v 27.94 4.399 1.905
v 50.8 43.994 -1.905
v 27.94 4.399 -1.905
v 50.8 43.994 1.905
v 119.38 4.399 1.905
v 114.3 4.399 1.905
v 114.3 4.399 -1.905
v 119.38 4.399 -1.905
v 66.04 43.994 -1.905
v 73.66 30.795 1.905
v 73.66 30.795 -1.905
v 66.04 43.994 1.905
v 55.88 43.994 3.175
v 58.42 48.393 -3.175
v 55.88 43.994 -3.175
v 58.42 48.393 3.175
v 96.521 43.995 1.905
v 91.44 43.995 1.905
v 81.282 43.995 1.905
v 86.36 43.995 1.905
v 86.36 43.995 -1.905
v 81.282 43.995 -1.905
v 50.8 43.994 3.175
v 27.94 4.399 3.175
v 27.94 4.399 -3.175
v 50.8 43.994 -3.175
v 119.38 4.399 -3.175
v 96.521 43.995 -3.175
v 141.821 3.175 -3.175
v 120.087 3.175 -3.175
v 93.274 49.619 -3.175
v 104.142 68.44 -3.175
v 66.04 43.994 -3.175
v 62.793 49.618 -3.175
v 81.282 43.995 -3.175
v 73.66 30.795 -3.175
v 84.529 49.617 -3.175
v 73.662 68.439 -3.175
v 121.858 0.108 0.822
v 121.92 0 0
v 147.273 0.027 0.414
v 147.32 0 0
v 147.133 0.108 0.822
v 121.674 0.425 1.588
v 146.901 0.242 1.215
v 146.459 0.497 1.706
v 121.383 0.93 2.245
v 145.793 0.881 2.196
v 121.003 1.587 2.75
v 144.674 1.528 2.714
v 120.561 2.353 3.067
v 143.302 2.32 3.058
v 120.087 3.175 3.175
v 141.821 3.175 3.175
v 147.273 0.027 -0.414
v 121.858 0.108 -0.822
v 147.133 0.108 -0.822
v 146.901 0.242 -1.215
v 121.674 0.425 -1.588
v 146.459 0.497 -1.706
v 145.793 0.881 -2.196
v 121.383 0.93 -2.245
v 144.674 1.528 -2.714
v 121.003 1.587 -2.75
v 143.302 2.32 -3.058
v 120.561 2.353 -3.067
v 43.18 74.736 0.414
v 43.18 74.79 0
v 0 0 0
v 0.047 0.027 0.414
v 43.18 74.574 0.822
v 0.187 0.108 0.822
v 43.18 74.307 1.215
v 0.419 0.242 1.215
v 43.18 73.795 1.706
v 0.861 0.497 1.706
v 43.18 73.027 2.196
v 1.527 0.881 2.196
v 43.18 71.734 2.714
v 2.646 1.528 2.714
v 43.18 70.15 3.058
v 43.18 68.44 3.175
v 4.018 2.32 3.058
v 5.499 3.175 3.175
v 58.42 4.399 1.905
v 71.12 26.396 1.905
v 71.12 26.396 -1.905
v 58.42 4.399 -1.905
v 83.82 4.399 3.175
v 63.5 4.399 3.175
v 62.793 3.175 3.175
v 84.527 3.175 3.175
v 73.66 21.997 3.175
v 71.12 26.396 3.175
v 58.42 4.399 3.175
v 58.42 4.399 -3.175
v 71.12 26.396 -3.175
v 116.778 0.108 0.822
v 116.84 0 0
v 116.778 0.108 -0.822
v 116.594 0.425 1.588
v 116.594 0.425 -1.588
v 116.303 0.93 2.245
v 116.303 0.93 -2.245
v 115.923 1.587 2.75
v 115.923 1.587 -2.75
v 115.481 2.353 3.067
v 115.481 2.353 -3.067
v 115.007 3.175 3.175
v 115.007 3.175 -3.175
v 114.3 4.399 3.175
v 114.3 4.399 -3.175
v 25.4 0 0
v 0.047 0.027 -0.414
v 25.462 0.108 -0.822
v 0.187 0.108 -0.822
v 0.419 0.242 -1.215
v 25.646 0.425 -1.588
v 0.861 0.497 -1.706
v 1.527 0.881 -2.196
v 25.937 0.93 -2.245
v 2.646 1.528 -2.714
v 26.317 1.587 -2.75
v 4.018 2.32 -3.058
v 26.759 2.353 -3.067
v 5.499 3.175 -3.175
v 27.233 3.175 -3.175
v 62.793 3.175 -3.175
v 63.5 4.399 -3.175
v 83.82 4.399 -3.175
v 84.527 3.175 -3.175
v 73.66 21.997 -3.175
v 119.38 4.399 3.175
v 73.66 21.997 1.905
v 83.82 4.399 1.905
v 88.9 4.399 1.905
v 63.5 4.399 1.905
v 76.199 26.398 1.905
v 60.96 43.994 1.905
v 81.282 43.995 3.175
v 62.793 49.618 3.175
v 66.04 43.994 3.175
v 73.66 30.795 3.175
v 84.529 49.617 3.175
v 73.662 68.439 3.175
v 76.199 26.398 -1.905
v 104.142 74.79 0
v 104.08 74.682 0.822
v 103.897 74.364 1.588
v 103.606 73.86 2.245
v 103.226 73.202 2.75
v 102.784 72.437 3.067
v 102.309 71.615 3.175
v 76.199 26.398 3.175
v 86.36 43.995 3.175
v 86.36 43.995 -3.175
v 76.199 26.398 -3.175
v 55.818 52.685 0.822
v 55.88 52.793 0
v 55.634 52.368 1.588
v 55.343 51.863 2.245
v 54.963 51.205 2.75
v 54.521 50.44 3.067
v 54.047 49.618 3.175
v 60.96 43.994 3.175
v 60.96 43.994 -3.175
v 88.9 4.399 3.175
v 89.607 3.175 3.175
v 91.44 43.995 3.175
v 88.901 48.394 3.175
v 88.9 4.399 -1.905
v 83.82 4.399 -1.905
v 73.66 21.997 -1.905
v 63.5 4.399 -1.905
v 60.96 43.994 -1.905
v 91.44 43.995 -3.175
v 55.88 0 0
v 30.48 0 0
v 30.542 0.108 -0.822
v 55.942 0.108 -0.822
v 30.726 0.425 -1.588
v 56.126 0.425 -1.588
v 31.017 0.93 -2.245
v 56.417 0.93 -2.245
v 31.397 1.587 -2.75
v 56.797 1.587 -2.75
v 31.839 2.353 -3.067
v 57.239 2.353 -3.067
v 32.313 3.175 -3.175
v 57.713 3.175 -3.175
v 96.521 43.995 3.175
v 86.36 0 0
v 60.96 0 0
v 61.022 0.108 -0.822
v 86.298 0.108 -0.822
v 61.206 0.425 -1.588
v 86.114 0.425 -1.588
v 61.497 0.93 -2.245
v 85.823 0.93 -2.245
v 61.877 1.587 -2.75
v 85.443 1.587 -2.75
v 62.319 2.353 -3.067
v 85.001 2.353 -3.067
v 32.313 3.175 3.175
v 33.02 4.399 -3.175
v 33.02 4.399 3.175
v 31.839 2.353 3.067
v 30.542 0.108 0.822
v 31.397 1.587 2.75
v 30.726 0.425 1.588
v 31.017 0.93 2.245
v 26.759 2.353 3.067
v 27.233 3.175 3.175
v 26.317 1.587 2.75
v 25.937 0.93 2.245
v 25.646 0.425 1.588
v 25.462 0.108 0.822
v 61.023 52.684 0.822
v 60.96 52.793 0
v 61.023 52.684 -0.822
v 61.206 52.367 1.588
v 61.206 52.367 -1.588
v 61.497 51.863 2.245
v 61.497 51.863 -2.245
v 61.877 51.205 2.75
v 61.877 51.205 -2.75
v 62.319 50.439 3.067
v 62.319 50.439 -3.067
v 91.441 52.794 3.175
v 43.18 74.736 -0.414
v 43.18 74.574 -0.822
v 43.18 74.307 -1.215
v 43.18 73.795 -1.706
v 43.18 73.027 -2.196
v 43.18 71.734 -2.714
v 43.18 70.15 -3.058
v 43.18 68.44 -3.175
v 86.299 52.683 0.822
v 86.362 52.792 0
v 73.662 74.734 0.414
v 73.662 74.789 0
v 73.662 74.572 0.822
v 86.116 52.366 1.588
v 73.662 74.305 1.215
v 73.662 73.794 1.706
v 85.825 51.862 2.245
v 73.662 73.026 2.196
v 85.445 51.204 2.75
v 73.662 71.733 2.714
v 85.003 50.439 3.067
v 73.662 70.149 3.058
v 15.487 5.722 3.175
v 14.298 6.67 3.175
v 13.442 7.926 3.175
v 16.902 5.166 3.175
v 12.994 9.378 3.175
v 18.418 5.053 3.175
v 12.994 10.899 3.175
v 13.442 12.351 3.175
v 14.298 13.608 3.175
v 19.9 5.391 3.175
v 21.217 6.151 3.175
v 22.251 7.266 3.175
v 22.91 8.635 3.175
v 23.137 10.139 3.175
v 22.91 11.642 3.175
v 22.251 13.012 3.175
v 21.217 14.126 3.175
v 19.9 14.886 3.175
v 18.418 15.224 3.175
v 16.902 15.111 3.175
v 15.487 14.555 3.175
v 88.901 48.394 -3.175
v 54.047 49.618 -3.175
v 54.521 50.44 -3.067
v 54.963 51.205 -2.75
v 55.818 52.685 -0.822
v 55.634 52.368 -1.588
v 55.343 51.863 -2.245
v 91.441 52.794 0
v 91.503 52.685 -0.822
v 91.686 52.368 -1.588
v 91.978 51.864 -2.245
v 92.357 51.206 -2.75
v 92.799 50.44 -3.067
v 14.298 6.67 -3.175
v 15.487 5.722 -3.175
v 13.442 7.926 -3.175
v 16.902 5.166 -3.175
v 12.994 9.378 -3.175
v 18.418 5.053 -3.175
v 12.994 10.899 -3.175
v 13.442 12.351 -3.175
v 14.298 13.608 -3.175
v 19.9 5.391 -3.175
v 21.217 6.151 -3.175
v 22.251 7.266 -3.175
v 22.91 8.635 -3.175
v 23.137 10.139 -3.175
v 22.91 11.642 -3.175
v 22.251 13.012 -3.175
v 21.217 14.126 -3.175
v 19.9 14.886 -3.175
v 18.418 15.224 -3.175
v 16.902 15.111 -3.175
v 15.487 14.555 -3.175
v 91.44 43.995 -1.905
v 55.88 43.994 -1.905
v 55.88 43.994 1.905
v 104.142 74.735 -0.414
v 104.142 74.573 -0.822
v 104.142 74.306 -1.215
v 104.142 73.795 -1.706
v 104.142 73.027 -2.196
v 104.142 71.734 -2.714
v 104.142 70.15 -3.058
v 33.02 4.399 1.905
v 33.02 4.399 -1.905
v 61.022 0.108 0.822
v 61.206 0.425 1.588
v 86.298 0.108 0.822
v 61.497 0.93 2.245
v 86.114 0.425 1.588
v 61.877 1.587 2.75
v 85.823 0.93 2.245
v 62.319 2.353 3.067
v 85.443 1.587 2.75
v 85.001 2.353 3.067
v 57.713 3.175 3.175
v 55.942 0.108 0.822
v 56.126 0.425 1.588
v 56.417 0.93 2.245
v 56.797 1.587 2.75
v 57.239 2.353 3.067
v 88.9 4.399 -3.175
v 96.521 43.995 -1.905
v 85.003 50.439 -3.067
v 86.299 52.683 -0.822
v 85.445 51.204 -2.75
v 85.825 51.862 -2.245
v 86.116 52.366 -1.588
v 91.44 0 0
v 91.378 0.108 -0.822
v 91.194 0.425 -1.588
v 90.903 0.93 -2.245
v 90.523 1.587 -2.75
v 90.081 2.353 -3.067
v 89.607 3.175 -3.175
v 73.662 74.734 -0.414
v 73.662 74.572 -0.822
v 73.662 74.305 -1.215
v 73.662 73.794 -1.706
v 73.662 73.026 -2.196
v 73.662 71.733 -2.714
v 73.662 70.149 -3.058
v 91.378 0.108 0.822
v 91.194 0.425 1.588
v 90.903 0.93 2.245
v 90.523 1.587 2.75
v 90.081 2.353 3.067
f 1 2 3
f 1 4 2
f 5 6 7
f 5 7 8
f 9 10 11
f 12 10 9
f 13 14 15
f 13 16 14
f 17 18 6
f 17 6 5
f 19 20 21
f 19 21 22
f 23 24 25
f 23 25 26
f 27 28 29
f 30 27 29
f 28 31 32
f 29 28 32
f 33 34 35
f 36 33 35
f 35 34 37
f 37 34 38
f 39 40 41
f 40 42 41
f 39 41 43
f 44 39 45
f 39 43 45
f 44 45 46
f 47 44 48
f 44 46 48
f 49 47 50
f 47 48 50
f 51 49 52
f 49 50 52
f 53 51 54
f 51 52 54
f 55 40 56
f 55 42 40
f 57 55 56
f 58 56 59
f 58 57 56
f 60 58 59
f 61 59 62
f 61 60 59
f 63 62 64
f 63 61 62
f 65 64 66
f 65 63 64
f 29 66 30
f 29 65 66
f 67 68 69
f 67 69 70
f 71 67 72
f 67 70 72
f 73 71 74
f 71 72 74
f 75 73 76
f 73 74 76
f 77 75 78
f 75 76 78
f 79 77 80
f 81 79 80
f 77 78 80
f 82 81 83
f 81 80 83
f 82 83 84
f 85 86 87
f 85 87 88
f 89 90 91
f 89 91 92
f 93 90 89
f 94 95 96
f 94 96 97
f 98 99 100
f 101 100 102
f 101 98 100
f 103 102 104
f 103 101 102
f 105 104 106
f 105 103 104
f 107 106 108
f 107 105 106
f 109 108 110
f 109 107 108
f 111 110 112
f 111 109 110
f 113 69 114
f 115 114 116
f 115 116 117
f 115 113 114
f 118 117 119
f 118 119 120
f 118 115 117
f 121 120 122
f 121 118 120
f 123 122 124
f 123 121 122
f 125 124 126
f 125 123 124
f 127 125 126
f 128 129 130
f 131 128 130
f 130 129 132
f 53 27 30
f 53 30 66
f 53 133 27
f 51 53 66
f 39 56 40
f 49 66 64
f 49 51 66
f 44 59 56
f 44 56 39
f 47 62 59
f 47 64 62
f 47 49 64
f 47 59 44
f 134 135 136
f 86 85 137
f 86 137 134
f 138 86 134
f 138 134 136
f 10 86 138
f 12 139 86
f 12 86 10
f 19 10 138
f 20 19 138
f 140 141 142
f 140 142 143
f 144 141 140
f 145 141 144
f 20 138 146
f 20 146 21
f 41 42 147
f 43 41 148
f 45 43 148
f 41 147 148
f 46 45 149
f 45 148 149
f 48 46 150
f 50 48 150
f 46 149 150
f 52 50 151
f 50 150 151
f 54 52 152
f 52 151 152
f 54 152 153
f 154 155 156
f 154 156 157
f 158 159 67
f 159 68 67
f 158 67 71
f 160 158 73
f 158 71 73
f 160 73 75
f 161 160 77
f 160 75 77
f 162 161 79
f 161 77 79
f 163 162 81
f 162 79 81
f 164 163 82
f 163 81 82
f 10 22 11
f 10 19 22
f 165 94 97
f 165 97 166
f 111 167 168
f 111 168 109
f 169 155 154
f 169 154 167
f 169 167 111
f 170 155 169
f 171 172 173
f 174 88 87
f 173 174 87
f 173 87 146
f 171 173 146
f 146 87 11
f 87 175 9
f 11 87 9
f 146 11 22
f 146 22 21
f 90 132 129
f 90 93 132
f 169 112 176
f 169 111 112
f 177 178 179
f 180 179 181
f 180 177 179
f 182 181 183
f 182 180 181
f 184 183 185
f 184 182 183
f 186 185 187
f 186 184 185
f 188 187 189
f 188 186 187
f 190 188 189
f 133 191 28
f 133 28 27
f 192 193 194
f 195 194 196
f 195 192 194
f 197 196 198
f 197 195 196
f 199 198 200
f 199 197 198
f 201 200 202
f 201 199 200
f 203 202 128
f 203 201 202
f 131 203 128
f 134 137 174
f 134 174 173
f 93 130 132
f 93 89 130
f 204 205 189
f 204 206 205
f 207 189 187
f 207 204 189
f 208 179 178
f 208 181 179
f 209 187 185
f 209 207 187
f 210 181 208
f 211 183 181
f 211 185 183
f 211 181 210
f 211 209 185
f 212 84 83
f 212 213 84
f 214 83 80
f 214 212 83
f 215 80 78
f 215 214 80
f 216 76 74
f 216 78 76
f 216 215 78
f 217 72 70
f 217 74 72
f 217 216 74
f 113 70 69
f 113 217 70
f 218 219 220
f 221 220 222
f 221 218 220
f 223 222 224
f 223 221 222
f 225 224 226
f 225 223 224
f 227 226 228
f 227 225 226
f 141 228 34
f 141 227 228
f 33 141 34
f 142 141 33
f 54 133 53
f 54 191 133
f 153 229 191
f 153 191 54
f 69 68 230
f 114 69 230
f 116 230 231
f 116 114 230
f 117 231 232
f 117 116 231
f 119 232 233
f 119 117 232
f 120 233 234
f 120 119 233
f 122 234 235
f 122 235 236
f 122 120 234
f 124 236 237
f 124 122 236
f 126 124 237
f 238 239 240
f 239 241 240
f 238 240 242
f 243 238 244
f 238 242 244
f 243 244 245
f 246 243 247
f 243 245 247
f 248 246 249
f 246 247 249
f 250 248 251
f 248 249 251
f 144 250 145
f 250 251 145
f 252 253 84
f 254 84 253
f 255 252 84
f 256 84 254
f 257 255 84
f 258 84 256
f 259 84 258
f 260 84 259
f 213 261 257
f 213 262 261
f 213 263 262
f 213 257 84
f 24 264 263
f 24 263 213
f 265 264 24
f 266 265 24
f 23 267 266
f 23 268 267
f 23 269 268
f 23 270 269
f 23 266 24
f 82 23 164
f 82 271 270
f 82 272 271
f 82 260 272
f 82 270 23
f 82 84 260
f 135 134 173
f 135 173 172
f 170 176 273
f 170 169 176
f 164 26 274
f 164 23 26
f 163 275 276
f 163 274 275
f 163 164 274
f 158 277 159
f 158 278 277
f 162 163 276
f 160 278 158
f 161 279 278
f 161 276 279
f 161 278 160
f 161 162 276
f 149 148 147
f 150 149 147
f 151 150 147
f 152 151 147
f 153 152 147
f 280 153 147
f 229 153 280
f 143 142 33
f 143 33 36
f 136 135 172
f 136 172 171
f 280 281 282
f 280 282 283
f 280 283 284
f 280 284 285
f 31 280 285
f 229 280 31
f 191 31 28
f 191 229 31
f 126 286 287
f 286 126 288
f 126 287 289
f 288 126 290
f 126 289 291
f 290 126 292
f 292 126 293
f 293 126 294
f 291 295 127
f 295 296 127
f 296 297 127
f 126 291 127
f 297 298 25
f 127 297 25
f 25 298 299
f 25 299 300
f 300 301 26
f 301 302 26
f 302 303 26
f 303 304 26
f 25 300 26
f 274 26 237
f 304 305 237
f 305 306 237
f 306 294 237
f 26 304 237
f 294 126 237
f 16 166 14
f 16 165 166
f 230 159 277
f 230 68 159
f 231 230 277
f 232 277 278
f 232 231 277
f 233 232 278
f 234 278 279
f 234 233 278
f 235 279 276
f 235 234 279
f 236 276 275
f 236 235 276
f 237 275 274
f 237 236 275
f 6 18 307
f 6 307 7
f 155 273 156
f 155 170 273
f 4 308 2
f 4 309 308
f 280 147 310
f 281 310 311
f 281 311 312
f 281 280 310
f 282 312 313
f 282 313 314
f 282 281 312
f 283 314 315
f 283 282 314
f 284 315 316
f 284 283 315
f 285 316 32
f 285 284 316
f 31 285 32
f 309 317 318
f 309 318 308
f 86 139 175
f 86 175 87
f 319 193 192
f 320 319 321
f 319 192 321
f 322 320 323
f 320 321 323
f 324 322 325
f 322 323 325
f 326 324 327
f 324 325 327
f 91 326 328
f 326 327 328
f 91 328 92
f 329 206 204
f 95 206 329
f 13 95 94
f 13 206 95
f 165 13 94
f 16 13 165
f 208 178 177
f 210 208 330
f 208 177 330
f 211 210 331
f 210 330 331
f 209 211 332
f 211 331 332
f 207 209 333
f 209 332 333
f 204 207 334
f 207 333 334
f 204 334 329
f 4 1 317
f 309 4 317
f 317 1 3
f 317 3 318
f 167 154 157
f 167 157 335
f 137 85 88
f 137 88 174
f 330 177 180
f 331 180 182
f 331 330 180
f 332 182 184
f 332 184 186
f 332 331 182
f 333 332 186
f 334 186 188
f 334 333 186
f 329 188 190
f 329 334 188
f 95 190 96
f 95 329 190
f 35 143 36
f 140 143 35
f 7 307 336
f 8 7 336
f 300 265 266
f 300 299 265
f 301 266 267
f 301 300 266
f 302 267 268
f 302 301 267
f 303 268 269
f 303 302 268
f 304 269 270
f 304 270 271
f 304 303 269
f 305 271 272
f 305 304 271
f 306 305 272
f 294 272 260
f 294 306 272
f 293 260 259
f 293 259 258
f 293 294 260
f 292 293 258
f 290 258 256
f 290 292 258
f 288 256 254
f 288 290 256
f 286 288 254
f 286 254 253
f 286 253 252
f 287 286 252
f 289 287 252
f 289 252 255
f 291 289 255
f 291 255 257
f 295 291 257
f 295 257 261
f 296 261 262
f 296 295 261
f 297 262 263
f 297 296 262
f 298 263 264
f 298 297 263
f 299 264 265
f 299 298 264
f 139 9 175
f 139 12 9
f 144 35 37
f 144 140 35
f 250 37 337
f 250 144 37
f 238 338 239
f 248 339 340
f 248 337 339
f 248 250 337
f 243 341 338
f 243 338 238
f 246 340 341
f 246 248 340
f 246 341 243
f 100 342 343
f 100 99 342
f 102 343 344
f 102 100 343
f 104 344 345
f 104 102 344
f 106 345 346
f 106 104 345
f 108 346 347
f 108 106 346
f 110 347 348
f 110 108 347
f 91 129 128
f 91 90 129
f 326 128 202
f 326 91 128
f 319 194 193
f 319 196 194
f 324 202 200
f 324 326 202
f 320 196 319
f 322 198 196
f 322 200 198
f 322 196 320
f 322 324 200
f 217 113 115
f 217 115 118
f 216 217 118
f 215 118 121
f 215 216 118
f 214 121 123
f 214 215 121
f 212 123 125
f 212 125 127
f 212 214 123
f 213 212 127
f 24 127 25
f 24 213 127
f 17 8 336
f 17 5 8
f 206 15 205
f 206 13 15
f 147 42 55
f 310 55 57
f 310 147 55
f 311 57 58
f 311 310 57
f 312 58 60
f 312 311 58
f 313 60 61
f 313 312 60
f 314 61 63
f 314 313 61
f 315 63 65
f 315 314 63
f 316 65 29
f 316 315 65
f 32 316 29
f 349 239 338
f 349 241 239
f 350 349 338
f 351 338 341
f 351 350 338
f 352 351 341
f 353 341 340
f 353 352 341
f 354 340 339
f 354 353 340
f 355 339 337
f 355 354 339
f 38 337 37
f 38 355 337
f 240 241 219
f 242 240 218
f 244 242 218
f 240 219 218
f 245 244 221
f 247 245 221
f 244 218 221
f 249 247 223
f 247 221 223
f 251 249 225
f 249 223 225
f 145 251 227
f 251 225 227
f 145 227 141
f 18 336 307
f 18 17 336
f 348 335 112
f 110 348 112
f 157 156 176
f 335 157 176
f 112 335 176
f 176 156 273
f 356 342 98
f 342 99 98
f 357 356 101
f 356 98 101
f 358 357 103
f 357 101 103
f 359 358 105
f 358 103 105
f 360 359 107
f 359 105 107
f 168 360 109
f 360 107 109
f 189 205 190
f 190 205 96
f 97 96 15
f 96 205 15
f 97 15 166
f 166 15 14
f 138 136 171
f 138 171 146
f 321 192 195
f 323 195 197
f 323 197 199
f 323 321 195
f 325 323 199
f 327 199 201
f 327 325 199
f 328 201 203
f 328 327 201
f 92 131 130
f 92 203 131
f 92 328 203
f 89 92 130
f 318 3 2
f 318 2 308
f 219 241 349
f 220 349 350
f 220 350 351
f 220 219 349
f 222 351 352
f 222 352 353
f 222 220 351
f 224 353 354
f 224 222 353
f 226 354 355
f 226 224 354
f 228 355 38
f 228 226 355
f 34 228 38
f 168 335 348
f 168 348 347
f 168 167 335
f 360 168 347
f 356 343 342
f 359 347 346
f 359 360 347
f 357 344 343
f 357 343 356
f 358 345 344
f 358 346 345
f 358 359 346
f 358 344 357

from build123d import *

# Parameters (mm, degrees)
F1_DEPTH = 3.175
F0_R     = 5.1001358677
F2_DEPTH = 1.905
F3_R     = 3.17499
F3_2_R   = 3.17499
F3_3_R   = 3.17499
F3_4_R   = 3.17499
F3_5_R   = 3.17499
F3_6_R   = 3.17499


# Not quite as in the source:
# - a fillet or chamfer is up to 0.001 mm smaller than in the source, because OpenCascade refuses the exact size


with BuildPart() as f1:
    # F0 (on Top) → F1 (new body, symmetric)
    with BuildSketch(Plane.XY):
        Polygon((55.88, 43.9940905122), (33.02, 4.3994090512), (30.48, 0), (55.88, 0), (58.42, 4.3994090512), (71.12, 26.3964543073), (60.96, 43.9940905122), (58.42, 48.3934995635), align=None)
    extrude(amount=F1_DEPTH, both=True)

    # F3#3 (radius 3.175 in the source; OpenCascade refuses exactly that, so slightly less here)
    f3_3_edges = [f1.edges().sort_by_distance(p)[0] for p in [
        (43.18, 0, -3.175),
        (43.18, 0, 3.175),
    ]]
    fillet(f3_3_edges, radius=F3_3_R)


with BuildPart() as f1b:
    # F0 (on Top) → F1, piece 2 (new body, symmetric)
    with BuildSketch(Plane.XY):
        Polygon((60.9602140859, 52.792537807), (66.04, 43.9940905122), (73.6602140859, 30.7954925508), (81.2823551529, 43.9952028573), (86.3618197643, 52.79161069), (73.6618197643, 74.7886559461), align=None)
    extrude(amount=F1_DEPTH, both=True)

    # F3#2 (radius 3.175 in the source; OpenCascade refuses exactly that, so slightly less here)
    f3_2_edges = [f1b.edges().sort_by_distance(p)[0] for p in [
        (67.311017, 63.790597, 3.175),
        (80.01182, 63.790133, 3.175),
        (80.01182, 63.790133, -3.175),
        (67.311017, 63.790597, -3.175),
    ]]
    fillet(f3_2_edges, radius=F3_2_R)


with BuildPart() as f1c:
    # F0 (on Top) → F1, piece 3 (new body, symmetric)
    with BuildSketch(Plane.XY):
        Polygon((88.9005352487, 48.3944264851), (86.360214113, 43.9952028573), (76.1989295703, 26.398308346), (88.9, 4.3994090512), (91.44, 0), (116.84, 0), (114.300072982, 4.3994511866), (91.4404622667, 43.9949752986), align=None)
    extrude(amount=F1_DEPTH, both=True)

    # F3#5 (radius 3.175 in the source; OpenCascade refuses exactly that, so slightly less here)
    f3_5_edges = [f1c.edges().sort_by_distance(p)[0] for p in [
        (104.14, 0, -3.175),
        (104.14, 0, 3.175),
    ]]
    fillet(f3_5_edges, radius=F3_5_R)


with BuildPart() as f1d:
    # F0 (on Top) → F1, piece 4 (new body, symmetric)
    with BuildSketch(Plane.XY):
        Polygon((73.66, 21.9970452561), (63.5, 4.3994090512), (60.96, 0), (86.36, 0), (83.82, 4.3994090512), align=None)
    extrude(amount=F1_DEPTH, both=True)

    # F3#4 (radius 3.175 in the source; OpenCascade refuses exactly that, so slightly less here)
    f3_4_edges = [f1d.edges().sort_by_distance(p)[0] for p in [
        (73.66, 0, -3.175),
        (73.66, 0, 3.175),
    ]]
    fillet(f3_4_edges, radius=F3_4_R)


with BuildPart() as f1e:
    # F0 (on Top) → F1, piece 5 (new body, symmetric)
    with BuildSketch(Plane.XY):
        Polygon((91.4408563844, 52.793650113), (96.520559582, 43.9949752986), (119.3800827134, 4.3994511866), (121.92, 0), (147.32, 0), (104.1424620628, 74.7897682521), align=None)
    extrude(amount=F1_DEPTH, both=True)

    # F3#6 (radius 3.175 in the source; OpenCascade refuses exactly that, so slightly less here)
    f3_6_edges = [f1e.edges().sort_by_distance(p)[0] for p in [
        (134.62, 0, -3.175),
        (125.731231, 37.394884, -3.175),
        (97.791659, 63.791709, -3.175),
        (134.62, 0, 3.175),
        (125.731231, 37.394884, 3.175),
    ]]
    fillet(f3_6_edges, radius=F3_6_R)


with BuildPart() as f1f:
    # F0 (on Top) → F1, piece 6 (new body, symmetric)
    with BuildSketch(Plane.XY):
        Polygon((43.18, 74.7899538708), (0, 0), (25.4, 0), (27.94, 4.3994090512), (50.8, 43.9940905122), (55.88, 52.7929086147), align=None)
        with Locations((18.0367678404, 10.1385600865)):
            Circle(F0_R, mode=Mode.SUBTRACT)
    extrude(amount=F1_DEPTH, both=True)

    # F3 (radius 3.175 in the source; OpenCascade refuses exactly that, so slightly less here)
    f3_edges = [f1f.edges().sort_by_distance(p)[0] for p in [
        (21.59, 37.394977, 3.175),
        (21.59, 37.394977, -3.175),
        (12.7, 0, -3.175),
        (12.7, 0, 3.175),
        (49.53, 63.791431, 3.175),
        (49.53, 63.791431, -3.175),
    ]]
    fillet(f3_edges, radius=F3_R)


with BuildPart() as f2:
    # F0 (on Top) → F2 (new body, symmetric)
    with BuildSketch(Plane.XY):
        Polygon((96.520559582, 43.9949752986), (91.4404622667, 43.9949752986), (114.300072982, 4.3994511866), (119.3800827134, 4.3994511866), align=None)
    extrude(amount=F2_DEPTH, both=True)


with BuildPart() as f2b:
    # F0 (on Top) → F2, piece 2 (new body, symmetric)
    with BuildSketch(Plane.XY):
        Polygon((66.04, 43.9940905122), (60.96, 43.9940905122), (71.12, 26.3964543073), (58.42, 4.3994090512), (63.5, 4.3994090512), (73.66, 21.9970452561), (83.82, 4.3994090512), (88.9, 4.3994090512), (76.1989295703, 26.398308346), (86.360214113, 43.9952028573), (81.2823551529, 43.9952028573), (73.6602140859, 30.7954925508), align=None)
    extrude(amount=F2_DEPTH, both=True)


with BuildPart() as f2c:
    # F0 (on Top) → F2, piece 3 (new body, symmetric)
    with BuildSketch(Plane.XY):
        Polygon((50.8, 43.9940905122), (27.94, 4.3994090512), (33.02, 4.3994090512), (55.88, 43.9940905122), align=None)
    extrude(amount=F2_DEPTH, both=True)


solid = Compound([f1.part, f1b.part, f1c.part, f1d.part, f1e.part, f1f.part, f2.part, f2b.part, f2c.part])
